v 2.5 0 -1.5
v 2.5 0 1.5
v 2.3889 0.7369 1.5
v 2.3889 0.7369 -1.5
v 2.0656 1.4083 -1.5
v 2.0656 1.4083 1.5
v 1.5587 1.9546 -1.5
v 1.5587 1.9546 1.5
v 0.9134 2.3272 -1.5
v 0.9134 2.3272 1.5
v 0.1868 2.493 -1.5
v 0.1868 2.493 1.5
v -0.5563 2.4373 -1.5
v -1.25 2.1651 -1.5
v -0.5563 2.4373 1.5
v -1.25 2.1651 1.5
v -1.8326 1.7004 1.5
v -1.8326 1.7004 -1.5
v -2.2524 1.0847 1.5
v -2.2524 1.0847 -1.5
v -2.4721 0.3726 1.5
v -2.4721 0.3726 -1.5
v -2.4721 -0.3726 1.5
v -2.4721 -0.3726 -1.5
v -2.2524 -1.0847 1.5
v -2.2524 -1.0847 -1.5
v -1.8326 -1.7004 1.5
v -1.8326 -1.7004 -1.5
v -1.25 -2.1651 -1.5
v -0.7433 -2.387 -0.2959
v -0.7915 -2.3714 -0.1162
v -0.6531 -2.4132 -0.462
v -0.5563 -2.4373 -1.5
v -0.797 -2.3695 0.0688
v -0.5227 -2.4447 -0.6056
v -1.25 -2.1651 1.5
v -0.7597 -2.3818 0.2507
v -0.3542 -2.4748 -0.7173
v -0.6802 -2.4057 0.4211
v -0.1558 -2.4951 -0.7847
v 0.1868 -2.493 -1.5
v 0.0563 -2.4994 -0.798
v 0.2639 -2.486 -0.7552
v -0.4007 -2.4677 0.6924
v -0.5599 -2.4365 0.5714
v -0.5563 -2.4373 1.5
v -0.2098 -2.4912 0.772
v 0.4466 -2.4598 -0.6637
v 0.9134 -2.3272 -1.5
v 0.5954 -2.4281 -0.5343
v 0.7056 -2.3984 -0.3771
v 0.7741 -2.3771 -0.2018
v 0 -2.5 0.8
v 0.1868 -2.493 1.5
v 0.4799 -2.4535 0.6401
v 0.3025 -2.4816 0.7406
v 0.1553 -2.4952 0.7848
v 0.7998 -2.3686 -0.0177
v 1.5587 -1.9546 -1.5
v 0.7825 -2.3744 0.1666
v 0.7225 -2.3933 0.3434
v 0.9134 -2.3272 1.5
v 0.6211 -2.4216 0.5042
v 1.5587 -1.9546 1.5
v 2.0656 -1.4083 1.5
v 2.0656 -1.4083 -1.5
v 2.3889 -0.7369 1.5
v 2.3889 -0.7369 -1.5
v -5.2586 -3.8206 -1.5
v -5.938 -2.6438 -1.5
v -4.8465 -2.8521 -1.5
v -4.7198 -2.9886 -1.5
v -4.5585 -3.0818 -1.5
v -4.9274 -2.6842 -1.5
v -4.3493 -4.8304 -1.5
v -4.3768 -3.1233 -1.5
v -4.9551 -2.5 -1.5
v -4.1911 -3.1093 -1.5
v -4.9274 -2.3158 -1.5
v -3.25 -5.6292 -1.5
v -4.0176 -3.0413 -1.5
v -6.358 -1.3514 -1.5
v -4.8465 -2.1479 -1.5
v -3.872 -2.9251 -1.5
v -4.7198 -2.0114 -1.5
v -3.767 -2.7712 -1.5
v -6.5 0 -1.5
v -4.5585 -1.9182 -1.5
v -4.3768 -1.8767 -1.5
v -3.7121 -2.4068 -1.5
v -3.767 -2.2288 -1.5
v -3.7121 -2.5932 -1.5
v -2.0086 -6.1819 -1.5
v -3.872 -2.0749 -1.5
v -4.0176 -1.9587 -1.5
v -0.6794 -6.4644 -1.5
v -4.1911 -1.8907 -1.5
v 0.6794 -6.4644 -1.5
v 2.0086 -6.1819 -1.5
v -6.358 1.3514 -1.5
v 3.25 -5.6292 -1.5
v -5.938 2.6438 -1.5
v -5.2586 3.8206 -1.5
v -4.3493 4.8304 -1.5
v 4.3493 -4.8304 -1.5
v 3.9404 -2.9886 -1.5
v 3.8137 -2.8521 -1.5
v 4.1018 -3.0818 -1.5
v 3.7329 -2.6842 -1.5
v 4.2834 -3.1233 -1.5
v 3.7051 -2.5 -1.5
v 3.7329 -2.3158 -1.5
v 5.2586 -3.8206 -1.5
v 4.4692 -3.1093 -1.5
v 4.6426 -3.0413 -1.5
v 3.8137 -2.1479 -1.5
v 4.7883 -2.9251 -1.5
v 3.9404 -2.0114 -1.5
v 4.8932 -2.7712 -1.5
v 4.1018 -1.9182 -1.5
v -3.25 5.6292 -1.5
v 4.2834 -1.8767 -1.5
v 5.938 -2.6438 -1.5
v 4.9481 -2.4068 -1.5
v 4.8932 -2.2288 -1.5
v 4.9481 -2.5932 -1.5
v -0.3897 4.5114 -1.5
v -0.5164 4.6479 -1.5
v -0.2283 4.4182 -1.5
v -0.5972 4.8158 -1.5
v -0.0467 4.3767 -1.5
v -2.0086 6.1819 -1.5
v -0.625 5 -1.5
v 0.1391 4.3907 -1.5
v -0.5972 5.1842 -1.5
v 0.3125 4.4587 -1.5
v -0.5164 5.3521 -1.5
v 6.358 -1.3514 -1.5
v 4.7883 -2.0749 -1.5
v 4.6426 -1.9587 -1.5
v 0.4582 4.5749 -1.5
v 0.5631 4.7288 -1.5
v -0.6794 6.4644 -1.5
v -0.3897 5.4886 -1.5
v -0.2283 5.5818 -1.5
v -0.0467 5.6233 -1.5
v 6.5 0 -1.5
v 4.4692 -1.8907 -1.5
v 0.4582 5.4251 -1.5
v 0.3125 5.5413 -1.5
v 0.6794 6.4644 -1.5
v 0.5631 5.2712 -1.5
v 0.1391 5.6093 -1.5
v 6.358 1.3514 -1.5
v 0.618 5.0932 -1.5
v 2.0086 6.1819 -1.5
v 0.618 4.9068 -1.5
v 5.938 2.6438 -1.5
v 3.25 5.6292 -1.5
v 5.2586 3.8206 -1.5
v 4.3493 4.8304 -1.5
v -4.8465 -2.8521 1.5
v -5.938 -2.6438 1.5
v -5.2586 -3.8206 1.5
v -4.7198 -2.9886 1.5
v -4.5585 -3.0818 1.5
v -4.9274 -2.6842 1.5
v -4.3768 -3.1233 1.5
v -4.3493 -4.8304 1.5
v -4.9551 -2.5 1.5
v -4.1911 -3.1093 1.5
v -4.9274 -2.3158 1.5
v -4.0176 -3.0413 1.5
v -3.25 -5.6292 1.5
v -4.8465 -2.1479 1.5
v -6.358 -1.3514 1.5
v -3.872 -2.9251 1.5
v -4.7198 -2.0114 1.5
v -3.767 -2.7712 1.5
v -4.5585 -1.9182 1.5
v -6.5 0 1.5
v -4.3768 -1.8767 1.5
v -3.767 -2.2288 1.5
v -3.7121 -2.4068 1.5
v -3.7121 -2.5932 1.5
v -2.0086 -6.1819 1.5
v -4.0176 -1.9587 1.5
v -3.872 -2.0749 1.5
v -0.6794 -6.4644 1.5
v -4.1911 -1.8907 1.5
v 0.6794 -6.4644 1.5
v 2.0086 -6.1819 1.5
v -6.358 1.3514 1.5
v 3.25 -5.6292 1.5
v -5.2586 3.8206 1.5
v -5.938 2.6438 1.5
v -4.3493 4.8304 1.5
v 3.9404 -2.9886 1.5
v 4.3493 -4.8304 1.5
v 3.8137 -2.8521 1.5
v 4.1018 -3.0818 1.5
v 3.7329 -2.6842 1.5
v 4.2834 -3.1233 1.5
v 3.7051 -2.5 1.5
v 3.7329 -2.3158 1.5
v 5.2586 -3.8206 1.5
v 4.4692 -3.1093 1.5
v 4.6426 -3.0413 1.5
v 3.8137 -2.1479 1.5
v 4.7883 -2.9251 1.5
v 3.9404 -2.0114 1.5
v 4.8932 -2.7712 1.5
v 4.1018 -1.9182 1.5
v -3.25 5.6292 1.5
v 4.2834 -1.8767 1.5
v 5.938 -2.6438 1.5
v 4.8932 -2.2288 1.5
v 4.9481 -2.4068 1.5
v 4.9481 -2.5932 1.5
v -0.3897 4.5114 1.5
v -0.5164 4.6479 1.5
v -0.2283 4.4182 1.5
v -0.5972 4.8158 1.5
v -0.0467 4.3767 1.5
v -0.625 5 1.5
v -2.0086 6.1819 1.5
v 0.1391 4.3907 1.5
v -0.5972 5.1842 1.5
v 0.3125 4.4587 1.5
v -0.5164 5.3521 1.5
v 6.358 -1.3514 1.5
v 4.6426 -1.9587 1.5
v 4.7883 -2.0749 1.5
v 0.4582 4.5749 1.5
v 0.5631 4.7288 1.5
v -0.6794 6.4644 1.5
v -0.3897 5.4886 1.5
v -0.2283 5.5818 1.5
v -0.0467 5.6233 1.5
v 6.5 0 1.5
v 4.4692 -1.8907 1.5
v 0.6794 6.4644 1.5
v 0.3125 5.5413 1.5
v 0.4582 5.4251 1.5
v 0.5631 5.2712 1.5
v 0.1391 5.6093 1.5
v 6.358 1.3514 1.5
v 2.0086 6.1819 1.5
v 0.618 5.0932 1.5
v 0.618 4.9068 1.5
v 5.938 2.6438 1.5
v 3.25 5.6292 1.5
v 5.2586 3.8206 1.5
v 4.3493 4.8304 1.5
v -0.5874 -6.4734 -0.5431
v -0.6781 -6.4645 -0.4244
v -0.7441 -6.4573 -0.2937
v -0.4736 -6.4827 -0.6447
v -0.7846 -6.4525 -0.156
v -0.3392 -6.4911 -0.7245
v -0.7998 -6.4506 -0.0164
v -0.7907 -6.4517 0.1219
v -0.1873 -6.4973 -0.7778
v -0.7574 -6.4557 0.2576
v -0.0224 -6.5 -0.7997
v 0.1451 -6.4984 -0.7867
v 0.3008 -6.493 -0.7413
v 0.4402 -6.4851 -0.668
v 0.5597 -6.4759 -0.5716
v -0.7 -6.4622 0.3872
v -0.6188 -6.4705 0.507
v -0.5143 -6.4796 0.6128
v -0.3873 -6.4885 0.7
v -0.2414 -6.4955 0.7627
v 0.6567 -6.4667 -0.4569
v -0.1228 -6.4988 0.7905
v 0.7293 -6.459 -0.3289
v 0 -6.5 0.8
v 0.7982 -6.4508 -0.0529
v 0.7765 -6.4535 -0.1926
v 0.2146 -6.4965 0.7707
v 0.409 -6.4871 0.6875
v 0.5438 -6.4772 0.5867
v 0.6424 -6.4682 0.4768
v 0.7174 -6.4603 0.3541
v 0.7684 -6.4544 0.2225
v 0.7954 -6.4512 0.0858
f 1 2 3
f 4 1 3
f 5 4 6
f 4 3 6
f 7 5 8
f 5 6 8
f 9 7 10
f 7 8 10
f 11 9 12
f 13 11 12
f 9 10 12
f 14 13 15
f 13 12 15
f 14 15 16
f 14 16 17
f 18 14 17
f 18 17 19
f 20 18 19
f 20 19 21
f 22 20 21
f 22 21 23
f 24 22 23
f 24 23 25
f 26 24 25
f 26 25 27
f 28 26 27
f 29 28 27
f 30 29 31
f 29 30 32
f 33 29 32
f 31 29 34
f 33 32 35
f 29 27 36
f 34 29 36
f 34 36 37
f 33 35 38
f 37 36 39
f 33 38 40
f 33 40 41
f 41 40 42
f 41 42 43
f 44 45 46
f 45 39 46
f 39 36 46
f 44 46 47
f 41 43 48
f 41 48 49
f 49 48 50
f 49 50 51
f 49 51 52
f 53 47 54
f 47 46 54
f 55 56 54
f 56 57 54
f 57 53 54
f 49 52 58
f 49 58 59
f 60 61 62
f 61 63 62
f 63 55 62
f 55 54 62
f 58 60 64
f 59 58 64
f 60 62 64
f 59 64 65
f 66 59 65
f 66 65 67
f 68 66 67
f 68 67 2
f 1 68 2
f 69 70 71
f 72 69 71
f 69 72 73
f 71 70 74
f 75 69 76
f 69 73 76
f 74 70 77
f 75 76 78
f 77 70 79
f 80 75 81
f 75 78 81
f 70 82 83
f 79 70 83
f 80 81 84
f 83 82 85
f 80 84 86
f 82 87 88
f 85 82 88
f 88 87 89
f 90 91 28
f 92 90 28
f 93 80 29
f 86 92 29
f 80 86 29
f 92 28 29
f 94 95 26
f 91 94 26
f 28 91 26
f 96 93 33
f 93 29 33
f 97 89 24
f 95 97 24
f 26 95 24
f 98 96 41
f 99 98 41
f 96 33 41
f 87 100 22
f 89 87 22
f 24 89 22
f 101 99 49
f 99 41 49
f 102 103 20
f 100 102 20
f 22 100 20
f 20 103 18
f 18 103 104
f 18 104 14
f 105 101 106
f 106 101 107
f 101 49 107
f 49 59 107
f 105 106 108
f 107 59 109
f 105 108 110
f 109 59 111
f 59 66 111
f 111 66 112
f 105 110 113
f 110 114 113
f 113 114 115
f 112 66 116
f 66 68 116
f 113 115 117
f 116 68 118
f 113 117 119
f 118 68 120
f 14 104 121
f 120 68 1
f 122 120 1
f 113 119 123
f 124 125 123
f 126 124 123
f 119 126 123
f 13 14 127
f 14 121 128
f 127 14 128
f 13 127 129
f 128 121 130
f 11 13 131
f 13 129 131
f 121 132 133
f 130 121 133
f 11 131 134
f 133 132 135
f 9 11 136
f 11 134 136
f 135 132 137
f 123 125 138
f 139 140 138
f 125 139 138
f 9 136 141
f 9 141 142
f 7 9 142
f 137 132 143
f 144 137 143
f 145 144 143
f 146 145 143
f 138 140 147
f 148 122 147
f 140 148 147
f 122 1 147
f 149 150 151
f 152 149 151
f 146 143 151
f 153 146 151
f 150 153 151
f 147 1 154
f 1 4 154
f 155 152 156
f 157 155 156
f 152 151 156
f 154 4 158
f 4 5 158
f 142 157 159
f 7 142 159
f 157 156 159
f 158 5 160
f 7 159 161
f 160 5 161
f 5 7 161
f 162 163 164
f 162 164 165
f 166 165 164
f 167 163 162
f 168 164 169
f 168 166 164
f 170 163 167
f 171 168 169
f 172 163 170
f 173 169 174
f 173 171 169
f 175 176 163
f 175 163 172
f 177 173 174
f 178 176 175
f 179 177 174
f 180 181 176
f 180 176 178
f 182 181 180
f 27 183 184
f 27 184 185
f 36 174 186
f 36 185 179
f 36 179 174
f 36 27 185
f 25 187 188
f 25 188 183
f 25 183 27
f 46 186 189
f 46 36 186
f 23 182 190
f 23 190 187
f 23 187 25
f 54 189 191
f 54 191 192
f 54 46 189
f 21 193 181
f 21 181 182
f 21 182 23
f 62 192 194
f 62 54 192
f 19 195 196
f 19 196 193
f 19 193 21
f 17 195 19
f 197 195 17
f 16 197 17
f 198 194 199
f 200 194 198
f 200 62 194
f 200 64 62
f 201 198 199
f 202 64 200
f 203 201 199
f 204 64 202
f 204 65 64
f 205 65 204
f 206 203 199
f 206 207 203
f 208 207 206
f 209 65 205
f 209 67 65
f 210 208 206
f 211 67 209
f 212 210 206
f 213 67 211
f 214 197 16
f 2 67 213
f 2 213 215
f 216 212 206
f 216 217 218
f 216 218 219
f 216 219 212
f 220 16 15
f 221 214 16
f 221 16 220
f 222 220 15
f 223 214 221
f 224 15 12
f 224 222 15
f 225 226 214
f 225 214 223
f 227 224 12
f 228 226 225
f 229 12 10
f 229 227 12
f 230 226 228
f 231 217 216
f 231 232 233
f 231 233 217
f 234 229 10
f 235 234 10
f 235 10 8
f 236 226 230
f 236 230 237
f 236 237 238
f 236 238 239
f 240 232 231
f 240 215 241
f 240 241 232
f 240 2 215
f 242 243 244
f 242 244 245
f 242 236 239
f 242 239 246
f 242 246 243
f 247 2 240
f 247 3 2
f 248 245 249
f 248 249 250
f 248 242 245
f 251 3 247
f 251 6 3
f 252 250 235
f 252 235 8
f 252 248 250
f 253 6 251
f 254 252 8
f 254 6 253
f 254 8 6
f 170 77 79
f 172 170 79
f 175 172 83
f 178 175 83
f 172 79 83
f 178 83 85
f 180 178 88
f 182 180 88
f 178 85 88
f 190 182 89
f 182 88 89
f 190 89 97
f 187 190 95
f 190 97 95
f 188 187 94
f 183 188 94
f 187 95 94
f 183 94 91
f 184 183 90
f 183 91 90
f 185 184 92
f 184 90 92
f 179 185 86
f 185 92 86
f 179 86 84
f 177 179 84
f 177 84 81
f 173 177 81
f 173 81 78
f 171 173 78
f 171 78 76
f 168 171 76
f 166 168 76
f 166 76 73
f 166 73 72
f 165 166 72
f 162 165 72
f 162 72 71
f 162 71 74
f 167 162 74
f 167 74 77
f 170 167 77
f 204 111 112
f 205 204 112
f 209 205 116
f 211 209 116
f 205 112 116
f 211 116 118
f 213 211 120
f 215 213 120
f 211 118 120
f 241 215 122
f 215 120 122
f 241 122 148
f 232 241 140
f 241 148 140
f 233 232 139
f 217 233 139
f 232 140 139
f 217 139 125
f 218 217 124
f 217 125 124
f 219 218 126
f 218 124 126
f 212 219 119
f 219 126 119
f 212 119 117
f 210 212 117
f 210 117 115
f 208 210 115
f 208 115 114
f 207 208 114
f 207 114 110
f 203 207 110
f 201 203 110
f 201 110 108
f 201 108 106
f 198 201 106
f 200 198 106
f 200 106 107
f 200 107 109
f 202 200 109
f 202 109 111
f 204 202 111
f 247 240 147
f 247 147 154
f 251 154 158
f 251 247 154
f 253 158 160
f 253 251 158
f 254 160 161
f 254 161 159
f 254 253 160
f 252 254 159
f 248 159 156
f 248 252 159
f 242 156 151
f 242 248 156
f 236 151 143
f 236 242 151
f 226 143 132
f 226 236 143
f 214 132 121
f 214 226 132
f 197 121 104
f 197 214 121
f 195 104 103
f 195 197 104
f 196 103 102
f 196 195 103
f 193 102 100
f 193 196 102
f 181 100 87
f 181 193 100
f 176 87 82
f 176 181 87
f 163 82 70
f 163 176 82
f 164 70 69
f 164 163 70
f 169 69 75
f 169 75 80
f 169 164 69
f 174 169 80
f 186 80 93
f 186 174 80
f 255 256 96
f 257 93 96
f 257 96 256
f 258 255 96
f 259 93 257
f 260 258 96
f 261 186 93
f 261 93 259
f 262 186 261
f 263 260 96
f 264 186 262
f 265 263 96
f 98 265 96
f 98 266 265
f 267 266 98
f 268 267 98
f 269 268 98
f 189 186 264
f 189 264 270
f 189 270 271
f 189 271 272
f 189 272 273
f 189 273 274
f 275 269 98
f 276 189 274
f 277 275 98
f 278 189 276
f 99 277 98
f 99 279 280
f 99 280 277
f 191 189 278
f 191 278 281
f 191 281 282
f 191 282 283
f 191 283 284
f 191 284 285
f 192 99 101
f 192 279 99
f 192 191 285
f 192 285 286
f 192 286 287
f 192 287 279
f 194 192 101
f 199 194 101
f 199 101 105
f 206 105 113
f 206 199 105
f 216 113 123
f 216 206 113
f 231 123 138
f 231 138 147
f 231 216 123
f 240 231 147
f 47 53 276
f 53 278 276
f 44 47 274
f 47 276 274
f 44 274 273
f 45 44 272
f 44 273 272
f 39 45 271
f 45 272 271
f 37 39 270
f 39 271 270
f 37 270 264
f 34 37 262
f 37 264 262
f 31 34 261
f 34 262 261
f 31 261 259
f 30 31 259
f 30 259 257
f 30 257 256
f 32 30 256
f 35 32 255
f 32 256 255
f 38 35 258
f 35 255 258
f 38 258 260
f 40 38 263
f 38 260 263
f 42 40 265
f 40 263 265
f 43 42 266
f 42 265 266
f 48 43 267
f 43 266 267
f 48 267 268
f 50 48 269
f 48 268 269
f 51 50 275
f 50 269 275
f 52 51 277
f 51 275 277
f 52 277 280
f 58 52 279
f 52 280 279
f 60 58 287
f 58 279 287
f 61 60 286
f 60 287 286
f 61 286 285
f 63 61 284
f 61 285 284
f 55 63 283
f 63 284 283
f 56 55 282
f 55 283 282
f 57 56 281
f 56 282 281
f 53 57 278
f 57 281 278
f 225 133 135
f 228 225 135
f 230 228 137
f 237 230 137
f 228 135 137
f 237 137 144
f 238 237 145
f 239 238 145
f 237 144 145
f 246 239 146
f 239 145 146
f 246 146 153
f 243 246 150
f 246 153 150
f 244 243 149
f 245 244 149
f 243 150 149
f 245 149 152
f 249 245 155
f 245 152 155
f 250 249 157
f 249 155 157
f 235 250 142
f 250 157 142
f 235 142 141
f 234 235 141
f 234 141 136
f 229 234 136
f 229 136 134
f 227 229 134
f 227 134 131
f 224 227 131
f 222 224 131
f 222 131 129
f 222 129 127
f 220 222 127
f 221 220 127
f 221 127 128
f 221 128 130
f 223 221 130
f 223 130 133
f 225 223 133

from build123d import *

# Parameters (mm, degrees)
MODEL_R             = 6.5
EXTRUDE_338_DEPTH   = 1.5
SKETCH_3_R          = 2.5
CUT_EXTRUDE_1_DEPTH = 10.669539803
HOLE_WIZARD_M1_6_D  = 1.25
SKETCH_8_W          = 0.8
SKETCH_8_H          = 6.5


with BuildPart() as part:
    # Model → Extrude 338 (new, symmetric)
    with BuildSketch(Plane.XY):
        Circle(MODEL_R)
    extrude(amount=EXTRUDE_338_DEPTH, both=True)

    # Эскиз3 → Вырез-Вытянуть1 (cut, through all)
    with BuildSketch(Plane.XY.offset(1.5)):
        Circle(SKETCH_3_R)
    extrude(amount=-CUT_EXTRUDE_1_DEPTH, mode=Mode.SUBTRACT)

    # Крепление шестерни M1.6 (through all)
    with Locations(Plane.XY.offset(1.5)):
        with Locations((0, 5), (4.330127019, -2.5), (-4.330127019, -2.5)):
            Hole(HOLE_WIZARD_M1_6_D / 2)

    # Эскиз8 → Крепление на вал M2 (revolve, cut)
    with BuildSketch(Plane(origin=(0, 0, 0), x_dir=(0, 0, 1), z_dir=(1, 0, 0))):
        with Locations((0.4, 3.25)):
            Rectangle(SKETCH_8_W, SKETCH_8_H)
    revolve(axis=Axis((0, 6.35, 0), (0, -1, 0)), mode=Mode.SUBTRACT)


solid = part.part
